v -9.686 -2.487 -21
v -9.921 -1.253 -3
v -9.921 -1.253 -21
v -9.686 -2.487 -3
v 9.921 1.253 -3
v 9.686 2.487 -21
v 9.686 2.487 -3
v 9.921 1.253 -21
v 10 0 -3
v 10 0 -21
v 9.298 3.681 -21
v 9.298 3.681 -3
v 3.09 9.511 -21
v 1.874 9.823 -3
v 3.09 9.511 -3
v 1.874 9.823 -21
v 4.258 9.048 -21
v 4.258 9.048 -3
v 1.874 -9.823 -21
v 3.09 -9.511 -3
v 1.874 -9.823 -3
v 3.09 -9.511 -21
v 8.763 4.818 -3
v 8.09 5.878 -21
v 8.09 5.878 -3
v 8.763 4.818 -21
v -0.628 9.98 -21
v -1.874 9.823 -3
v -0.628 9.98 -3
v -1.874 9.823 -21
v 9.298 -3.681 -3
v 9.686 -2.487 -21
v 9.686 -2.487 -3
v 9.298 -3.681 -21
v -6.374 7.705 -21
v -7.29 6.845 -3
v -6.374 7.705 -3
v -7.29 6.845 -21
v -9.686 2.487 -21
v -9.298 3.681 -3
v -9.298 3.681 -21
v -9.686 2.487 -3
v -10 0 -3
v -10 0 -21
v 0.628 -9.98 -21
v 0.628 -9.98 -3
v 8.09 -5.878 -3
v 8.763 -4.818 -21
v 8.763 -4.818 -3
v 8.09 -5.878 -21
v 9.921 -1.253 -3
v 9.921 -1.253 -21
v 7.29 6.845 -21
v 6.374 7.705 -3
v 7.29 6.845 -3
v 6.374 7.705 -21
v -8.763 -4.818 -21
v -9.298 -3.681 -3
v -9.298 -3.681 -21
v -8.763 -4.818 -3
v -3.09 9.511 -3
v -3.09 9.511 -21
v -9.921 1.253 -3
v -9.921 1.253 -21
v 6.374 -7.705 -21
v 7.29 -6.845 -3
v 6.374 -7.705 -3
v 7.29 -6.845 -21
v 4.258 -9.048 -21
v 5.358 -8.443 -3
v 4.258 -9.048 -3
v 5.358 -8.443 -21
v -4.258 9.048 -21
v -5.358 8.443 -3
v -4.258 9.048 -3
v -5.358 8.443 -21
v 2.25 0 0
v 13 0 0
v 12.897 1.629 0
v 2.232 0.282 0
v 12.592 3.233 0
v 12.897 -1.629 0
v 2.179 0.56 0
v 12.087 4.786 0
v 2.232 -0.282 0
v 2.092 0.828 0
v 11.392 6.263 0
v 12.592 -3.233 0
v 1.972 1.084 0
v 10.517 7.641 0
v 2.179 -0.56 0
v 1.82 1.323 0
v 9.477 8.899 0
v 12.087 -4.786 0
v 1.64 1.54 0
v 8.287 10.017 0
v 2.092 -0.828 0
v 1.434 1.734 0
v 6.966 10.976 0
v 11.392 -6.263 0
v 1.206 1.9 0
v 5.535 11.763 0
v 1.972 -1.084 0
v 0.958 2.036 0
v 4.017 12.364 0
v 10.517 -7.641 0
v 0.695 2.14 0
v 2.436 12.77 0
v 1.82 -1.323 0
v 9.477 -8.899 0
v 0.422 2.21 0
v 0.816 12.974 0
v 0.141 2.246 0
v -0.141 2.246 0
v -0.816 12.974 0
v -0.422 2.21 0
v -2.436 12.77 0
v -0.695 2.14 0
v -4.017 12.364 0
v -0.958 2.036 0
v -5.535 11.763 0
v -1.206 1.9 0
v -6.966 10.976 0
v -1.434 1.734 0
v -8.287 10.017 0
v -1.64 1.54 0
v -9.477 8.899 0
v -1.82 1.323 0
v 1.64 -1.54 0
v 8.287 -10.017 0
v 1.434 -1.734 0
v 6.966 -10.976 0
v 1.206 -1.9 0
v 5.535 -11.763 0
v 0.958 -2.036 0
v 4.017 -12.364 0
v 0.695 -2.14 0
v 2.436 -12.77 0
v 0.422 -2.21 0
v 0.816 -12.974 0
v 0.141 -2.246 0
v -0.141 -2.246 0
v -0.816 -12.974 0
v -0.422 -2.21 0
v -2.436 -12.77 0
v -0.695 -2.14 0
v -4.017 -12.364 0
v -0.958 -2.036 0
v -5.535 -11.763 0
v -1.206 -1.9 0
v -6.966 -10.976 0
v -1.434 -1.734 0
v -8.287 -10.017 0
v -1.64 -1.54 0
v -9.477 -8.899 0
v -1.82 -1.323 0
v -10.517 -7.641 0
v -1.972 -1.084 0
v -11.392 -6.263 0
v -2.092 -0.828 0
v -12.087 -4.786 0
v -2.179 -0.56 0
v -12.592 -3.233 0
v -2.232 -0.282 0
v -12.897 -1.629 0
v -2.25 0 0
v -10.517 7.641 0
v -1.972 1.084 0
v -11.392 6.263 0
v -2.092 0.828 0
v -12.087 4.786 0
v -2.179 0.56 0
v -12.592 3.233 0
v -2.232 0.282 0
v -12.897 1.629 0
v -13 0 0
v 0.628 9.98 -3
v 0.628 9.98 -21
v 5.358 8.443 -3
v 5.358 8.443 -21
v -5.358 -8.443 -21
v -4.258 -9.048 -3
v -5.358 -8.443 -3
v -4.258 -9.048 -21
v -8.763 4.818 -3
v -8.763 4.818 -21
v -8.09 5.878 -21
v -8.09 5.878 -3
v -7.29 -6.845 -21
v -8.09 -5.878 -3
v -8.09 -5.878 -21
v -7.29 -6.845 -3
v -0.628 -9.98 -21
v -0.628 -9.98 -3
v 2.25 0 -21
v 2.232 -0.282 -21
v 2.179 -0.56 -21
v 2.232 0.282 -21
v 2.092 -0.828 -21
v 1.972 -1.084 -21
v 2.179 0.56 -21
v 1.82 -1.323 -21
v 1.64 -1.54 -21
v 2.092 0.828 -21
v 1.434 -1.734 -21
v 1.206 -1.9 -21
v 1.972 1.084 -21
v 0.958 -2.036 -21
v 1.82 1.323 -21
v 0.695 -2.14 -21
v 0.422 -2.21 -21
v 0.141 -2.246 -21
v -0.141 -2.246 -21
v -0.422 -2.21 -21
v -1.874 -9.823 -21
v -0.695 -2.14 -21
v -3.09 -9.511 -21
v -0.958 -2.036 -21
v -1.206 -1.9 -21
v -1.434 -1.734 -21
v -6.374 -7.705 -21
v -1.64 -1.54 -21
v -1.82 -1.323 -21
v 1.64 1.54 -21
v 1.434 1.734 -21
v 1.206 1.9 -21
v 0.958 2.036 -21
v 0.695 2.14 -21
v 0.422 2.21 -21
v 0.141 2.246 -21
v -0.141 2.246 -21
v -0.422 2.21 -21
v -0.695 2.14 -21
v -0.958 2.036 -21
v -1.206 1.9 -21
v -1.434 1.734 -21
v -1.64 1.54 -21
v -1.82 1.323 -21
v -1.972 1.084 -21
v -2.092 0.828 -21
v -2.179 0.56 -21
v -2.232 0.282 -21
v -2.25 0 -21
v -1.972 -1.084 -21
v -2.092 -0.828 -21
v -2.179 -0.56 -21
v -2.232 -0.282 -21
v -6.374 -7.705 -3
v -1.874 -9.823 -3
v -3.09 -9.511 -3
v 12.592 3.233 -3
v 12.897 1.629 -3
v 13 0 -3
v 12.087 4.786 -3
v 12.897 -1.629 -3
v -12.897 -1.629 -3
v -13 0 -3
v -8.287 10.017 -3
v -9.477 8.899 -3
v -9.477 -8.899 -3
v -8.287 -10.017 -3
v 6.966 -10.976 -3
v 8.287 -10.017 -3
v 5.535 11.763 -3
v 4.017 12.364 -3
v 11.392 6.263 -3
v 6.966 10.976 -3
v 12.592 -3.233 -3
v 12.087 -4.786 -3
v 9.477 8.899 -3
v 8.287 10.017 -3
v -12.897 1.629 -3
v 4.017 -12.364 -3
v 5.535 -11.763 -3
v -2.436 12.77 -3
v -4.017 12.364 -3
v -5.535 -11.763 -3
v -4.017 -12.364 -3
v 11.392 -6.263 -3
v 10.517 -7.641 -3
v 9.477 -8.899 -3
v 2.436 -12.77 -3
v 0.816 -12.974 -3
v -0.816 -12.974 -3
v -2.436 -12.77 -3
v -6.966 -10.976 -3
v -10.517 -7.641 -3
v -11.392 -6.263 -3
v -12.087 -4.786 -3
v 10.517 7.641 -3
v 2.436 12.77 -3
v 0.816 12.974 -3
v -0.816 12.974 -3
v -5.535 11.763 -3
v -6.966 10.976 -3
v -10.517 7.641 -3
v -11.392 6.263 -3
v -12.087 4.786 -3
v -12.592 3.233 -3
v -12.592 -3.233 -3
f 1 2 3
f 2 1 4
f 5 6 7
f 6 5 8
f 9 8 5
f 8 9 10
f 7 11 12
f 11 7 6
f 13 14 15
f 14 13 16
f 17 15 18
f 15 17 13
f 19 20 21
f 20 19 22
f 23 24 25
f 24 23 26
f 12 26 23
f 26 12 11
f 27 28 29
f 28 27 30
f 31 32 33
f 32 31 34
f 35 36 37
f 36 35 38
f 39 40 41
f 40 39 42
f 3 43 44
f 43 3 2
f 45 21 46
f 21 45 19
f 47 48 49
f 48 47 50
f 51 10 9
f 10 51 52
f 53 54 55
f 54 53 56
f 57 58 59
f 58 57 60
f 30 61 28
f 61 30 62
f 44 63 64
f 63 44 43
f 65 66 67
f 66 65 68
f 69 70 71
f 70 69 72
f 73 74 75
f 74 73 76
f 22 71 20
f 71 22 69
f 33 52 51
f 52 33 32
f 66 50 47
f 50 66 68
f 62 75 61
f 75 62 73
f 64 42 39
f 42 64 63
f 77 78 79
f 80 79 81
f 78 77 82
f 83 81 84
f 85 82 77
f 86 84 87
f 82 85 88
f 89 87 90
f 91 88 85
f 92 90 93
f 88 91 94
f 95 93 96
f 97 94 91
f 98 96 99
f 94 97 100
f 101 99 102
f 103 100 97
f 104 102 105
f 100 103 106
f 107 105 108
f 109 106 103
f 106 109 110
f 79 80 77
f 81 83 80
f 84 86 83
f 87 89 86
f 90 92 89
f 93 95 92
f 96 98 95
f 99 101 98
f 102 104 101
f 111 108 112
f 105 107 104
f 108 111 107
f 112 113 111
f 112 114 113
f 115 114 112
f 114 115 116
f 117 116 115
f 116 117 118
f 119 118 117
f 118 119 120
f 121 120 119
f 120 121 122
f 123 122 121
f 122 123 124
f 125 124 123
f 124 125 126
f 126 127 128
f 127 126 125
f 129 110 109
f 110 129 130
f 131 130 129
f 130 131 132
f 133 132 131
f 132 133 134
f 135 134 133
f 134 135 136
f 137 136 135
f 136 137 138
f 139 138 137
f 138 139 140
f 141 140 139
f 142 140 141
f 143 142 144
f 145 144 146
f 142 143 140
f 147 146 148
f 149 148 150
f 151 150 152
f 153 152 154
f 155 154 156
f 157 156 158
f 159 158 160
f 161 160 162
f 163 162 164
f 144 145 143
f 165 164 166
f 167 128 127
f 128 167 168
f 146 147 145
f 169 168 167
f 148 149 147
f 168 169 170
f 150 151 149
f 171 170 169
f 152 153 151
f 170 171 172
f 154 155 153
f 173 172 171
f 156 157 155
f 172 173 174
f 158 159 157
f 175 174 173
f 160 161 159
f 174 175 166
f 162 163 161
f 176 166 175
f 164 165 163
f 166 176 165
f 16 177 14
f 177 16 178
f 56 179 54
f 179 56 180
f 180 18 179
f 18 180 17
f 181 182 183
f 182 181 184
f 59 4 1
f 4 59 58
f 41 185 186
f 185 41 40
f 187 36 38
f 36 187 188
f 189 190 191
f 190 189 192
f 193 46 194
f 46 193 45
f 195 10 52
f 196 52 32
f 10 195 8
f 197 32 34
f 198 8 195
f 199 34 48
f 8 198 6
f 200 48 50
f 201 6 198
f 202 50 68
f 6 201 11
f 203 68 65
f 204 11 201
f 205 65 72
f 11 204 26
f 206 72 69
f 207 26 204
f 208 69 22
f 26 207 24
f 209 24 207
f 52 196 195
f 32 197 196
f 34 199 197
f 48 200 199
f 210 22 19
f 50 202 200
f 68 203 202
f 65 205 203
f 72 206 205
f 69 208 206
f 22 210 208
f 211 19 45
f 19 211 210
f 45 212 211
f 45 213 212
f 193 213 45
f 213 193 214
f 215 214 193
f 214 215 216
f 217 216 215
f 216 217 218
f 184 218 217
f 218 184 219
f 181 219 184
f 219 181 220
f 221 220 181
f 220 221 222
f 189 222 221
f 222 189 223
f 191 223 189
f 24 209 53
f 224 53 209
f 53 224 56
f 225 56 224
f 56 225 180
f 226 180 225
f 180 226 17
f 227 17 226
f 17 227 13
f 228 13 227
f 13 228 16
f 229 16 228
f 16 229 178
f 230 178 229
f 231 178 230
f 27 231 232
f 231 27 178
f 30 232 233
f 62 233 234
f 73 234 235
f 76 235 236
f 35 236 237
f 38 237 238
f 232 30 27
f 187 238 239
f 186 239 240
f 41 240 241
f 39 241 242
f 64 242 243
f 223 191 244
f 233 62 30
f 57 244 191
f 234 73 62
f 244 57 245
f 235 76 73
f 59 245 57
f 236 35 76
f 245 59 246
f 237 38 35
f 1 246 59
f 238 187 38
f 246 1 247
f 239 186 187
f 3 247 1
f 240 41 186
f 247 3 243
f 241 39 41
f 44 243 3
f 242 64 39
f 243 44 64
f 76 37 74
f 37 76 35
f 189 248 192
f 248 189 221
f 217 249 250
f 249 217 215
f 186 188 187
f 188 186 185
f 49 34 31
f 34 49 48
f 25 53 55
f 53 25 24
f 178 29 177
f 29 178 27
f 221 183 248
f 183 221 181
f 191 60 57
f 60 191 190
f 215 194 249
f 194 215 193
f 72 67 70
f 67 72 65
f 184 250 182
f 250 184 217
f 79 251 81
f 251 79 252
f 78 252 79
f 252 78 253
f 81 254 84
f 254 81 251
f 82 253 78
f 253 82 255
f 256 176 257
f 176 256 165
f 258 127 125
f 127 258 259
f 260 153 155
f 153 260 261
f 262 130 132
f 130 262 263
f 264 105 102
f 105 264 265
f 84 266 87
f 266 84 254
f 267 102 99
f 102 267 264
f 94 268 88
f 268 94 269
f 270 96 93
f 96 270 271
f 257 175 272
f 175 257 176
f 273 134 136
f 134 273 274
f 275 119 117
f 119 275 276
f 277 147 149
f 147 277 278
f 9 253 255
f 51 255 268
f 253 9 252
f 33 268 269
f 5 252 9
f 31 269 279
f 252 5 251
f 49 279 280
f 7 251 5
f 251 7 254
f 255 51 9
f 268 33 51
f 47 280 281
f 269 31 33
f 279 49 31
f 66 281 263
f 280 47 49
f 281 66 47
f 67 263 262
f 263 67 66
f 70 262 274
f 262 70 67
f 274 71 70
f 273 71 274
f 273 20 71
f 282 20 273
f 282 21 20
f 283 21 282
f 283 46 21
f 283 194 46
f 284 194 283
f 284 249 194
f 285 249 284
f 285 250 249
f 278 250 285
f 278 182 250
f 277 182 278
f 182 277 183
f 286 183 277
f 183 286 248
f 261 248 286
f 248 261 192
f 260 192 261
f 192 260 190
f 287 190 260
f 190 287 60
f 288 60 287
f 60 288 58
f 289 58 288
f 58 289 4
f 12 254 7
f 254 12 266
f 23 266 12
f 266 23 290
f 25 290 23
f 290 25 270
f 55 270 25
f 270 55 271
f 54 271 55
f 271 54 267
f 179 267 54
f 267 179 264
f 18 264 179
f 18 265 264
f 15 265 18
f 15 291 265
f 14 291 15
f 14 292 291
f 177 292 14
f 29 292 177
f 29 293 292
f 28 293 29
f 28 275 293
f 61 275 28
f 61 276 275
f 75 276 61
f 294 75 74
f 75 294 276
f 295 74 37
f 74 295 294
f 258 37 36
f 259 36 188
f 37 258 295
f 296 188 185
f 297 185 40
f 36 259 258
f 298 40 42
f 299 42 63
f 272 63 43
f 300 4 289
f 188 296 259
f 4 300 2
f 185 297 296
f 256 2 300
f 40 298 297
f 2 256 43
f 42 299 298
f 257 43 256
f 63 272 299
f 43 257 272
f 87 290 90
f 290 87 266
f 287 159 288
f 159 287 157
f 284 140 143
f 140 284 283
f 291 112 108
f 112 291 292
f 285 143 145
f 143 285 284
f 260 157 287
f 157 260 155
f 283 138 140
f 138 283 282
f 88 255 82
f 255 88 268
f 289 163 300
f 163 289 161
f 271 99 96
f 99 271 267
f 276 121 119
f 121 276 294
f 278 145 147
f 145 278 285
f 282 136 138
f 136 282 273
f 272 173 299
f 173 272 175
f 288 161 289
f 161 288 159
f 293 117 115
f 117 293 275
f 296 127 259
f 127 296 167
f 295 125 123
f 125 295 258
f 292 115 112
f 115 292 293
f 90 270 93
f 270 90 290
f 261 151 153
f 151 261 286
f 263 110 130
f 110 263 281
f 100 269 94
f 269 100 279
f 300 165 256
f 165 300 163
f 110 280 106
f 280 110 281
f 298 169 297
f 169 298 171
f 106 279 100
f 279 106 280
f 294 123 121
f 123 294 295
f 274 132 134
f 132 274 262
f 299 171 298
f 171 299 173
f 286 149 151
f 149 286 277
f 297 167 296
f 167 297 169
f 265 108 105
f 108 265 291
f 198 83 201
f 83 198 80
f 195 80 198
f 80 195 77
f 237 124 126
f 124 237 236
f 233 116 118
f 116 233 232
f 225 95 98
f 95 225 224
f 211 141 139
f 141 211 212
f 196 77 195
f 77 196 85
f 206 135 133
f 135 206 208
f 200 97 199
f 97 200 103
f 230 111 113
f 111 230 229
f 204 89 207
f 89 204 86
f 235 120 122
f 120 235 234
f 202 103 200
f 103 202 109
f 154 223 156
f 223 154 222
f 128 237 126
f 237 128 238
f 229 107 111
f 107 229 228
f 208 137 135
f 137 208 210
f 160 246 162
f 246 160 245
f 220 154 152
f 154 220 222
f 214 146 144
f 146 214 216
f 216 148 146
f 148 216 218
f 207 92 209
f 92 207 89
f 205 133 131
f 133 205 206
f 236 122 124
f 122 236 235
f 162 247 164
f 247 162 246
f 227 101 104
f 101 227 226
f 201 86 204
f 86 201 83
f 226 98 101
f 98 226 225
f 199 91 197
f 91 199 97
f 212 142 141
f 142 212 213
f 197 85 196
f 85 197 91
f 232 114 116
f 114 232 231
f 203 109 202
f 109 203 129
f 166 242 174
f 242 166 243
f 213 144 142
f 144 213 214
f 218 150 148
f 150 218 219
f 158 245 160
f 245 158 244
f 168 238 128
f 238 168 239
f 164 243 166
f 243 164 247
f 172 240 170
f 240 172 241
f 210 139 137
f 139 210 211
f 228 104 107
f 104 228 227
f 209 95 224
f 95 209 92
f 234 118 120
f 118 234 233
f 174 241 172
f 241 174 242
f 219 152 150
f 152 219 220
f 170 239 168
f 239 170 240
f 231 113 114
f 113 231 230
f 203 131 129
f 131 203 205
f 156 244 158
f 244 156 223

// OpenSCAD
$fn = 50;


difference() {
	union() {
		translate(v = [0, 0, -21.0000000000]) {
			cylinder(h = 21, r = 10.0000000000);
		}
		translate(v = [0, 0, -3.0000000000]) {
			cylinder(h = 3, r = 13.0000000000);
		}
	}
	union() {
		#translate(v = [0, 0, -21]) {
			cylinder(h = 21, r = 2.2500000000);
		}
	}
}
